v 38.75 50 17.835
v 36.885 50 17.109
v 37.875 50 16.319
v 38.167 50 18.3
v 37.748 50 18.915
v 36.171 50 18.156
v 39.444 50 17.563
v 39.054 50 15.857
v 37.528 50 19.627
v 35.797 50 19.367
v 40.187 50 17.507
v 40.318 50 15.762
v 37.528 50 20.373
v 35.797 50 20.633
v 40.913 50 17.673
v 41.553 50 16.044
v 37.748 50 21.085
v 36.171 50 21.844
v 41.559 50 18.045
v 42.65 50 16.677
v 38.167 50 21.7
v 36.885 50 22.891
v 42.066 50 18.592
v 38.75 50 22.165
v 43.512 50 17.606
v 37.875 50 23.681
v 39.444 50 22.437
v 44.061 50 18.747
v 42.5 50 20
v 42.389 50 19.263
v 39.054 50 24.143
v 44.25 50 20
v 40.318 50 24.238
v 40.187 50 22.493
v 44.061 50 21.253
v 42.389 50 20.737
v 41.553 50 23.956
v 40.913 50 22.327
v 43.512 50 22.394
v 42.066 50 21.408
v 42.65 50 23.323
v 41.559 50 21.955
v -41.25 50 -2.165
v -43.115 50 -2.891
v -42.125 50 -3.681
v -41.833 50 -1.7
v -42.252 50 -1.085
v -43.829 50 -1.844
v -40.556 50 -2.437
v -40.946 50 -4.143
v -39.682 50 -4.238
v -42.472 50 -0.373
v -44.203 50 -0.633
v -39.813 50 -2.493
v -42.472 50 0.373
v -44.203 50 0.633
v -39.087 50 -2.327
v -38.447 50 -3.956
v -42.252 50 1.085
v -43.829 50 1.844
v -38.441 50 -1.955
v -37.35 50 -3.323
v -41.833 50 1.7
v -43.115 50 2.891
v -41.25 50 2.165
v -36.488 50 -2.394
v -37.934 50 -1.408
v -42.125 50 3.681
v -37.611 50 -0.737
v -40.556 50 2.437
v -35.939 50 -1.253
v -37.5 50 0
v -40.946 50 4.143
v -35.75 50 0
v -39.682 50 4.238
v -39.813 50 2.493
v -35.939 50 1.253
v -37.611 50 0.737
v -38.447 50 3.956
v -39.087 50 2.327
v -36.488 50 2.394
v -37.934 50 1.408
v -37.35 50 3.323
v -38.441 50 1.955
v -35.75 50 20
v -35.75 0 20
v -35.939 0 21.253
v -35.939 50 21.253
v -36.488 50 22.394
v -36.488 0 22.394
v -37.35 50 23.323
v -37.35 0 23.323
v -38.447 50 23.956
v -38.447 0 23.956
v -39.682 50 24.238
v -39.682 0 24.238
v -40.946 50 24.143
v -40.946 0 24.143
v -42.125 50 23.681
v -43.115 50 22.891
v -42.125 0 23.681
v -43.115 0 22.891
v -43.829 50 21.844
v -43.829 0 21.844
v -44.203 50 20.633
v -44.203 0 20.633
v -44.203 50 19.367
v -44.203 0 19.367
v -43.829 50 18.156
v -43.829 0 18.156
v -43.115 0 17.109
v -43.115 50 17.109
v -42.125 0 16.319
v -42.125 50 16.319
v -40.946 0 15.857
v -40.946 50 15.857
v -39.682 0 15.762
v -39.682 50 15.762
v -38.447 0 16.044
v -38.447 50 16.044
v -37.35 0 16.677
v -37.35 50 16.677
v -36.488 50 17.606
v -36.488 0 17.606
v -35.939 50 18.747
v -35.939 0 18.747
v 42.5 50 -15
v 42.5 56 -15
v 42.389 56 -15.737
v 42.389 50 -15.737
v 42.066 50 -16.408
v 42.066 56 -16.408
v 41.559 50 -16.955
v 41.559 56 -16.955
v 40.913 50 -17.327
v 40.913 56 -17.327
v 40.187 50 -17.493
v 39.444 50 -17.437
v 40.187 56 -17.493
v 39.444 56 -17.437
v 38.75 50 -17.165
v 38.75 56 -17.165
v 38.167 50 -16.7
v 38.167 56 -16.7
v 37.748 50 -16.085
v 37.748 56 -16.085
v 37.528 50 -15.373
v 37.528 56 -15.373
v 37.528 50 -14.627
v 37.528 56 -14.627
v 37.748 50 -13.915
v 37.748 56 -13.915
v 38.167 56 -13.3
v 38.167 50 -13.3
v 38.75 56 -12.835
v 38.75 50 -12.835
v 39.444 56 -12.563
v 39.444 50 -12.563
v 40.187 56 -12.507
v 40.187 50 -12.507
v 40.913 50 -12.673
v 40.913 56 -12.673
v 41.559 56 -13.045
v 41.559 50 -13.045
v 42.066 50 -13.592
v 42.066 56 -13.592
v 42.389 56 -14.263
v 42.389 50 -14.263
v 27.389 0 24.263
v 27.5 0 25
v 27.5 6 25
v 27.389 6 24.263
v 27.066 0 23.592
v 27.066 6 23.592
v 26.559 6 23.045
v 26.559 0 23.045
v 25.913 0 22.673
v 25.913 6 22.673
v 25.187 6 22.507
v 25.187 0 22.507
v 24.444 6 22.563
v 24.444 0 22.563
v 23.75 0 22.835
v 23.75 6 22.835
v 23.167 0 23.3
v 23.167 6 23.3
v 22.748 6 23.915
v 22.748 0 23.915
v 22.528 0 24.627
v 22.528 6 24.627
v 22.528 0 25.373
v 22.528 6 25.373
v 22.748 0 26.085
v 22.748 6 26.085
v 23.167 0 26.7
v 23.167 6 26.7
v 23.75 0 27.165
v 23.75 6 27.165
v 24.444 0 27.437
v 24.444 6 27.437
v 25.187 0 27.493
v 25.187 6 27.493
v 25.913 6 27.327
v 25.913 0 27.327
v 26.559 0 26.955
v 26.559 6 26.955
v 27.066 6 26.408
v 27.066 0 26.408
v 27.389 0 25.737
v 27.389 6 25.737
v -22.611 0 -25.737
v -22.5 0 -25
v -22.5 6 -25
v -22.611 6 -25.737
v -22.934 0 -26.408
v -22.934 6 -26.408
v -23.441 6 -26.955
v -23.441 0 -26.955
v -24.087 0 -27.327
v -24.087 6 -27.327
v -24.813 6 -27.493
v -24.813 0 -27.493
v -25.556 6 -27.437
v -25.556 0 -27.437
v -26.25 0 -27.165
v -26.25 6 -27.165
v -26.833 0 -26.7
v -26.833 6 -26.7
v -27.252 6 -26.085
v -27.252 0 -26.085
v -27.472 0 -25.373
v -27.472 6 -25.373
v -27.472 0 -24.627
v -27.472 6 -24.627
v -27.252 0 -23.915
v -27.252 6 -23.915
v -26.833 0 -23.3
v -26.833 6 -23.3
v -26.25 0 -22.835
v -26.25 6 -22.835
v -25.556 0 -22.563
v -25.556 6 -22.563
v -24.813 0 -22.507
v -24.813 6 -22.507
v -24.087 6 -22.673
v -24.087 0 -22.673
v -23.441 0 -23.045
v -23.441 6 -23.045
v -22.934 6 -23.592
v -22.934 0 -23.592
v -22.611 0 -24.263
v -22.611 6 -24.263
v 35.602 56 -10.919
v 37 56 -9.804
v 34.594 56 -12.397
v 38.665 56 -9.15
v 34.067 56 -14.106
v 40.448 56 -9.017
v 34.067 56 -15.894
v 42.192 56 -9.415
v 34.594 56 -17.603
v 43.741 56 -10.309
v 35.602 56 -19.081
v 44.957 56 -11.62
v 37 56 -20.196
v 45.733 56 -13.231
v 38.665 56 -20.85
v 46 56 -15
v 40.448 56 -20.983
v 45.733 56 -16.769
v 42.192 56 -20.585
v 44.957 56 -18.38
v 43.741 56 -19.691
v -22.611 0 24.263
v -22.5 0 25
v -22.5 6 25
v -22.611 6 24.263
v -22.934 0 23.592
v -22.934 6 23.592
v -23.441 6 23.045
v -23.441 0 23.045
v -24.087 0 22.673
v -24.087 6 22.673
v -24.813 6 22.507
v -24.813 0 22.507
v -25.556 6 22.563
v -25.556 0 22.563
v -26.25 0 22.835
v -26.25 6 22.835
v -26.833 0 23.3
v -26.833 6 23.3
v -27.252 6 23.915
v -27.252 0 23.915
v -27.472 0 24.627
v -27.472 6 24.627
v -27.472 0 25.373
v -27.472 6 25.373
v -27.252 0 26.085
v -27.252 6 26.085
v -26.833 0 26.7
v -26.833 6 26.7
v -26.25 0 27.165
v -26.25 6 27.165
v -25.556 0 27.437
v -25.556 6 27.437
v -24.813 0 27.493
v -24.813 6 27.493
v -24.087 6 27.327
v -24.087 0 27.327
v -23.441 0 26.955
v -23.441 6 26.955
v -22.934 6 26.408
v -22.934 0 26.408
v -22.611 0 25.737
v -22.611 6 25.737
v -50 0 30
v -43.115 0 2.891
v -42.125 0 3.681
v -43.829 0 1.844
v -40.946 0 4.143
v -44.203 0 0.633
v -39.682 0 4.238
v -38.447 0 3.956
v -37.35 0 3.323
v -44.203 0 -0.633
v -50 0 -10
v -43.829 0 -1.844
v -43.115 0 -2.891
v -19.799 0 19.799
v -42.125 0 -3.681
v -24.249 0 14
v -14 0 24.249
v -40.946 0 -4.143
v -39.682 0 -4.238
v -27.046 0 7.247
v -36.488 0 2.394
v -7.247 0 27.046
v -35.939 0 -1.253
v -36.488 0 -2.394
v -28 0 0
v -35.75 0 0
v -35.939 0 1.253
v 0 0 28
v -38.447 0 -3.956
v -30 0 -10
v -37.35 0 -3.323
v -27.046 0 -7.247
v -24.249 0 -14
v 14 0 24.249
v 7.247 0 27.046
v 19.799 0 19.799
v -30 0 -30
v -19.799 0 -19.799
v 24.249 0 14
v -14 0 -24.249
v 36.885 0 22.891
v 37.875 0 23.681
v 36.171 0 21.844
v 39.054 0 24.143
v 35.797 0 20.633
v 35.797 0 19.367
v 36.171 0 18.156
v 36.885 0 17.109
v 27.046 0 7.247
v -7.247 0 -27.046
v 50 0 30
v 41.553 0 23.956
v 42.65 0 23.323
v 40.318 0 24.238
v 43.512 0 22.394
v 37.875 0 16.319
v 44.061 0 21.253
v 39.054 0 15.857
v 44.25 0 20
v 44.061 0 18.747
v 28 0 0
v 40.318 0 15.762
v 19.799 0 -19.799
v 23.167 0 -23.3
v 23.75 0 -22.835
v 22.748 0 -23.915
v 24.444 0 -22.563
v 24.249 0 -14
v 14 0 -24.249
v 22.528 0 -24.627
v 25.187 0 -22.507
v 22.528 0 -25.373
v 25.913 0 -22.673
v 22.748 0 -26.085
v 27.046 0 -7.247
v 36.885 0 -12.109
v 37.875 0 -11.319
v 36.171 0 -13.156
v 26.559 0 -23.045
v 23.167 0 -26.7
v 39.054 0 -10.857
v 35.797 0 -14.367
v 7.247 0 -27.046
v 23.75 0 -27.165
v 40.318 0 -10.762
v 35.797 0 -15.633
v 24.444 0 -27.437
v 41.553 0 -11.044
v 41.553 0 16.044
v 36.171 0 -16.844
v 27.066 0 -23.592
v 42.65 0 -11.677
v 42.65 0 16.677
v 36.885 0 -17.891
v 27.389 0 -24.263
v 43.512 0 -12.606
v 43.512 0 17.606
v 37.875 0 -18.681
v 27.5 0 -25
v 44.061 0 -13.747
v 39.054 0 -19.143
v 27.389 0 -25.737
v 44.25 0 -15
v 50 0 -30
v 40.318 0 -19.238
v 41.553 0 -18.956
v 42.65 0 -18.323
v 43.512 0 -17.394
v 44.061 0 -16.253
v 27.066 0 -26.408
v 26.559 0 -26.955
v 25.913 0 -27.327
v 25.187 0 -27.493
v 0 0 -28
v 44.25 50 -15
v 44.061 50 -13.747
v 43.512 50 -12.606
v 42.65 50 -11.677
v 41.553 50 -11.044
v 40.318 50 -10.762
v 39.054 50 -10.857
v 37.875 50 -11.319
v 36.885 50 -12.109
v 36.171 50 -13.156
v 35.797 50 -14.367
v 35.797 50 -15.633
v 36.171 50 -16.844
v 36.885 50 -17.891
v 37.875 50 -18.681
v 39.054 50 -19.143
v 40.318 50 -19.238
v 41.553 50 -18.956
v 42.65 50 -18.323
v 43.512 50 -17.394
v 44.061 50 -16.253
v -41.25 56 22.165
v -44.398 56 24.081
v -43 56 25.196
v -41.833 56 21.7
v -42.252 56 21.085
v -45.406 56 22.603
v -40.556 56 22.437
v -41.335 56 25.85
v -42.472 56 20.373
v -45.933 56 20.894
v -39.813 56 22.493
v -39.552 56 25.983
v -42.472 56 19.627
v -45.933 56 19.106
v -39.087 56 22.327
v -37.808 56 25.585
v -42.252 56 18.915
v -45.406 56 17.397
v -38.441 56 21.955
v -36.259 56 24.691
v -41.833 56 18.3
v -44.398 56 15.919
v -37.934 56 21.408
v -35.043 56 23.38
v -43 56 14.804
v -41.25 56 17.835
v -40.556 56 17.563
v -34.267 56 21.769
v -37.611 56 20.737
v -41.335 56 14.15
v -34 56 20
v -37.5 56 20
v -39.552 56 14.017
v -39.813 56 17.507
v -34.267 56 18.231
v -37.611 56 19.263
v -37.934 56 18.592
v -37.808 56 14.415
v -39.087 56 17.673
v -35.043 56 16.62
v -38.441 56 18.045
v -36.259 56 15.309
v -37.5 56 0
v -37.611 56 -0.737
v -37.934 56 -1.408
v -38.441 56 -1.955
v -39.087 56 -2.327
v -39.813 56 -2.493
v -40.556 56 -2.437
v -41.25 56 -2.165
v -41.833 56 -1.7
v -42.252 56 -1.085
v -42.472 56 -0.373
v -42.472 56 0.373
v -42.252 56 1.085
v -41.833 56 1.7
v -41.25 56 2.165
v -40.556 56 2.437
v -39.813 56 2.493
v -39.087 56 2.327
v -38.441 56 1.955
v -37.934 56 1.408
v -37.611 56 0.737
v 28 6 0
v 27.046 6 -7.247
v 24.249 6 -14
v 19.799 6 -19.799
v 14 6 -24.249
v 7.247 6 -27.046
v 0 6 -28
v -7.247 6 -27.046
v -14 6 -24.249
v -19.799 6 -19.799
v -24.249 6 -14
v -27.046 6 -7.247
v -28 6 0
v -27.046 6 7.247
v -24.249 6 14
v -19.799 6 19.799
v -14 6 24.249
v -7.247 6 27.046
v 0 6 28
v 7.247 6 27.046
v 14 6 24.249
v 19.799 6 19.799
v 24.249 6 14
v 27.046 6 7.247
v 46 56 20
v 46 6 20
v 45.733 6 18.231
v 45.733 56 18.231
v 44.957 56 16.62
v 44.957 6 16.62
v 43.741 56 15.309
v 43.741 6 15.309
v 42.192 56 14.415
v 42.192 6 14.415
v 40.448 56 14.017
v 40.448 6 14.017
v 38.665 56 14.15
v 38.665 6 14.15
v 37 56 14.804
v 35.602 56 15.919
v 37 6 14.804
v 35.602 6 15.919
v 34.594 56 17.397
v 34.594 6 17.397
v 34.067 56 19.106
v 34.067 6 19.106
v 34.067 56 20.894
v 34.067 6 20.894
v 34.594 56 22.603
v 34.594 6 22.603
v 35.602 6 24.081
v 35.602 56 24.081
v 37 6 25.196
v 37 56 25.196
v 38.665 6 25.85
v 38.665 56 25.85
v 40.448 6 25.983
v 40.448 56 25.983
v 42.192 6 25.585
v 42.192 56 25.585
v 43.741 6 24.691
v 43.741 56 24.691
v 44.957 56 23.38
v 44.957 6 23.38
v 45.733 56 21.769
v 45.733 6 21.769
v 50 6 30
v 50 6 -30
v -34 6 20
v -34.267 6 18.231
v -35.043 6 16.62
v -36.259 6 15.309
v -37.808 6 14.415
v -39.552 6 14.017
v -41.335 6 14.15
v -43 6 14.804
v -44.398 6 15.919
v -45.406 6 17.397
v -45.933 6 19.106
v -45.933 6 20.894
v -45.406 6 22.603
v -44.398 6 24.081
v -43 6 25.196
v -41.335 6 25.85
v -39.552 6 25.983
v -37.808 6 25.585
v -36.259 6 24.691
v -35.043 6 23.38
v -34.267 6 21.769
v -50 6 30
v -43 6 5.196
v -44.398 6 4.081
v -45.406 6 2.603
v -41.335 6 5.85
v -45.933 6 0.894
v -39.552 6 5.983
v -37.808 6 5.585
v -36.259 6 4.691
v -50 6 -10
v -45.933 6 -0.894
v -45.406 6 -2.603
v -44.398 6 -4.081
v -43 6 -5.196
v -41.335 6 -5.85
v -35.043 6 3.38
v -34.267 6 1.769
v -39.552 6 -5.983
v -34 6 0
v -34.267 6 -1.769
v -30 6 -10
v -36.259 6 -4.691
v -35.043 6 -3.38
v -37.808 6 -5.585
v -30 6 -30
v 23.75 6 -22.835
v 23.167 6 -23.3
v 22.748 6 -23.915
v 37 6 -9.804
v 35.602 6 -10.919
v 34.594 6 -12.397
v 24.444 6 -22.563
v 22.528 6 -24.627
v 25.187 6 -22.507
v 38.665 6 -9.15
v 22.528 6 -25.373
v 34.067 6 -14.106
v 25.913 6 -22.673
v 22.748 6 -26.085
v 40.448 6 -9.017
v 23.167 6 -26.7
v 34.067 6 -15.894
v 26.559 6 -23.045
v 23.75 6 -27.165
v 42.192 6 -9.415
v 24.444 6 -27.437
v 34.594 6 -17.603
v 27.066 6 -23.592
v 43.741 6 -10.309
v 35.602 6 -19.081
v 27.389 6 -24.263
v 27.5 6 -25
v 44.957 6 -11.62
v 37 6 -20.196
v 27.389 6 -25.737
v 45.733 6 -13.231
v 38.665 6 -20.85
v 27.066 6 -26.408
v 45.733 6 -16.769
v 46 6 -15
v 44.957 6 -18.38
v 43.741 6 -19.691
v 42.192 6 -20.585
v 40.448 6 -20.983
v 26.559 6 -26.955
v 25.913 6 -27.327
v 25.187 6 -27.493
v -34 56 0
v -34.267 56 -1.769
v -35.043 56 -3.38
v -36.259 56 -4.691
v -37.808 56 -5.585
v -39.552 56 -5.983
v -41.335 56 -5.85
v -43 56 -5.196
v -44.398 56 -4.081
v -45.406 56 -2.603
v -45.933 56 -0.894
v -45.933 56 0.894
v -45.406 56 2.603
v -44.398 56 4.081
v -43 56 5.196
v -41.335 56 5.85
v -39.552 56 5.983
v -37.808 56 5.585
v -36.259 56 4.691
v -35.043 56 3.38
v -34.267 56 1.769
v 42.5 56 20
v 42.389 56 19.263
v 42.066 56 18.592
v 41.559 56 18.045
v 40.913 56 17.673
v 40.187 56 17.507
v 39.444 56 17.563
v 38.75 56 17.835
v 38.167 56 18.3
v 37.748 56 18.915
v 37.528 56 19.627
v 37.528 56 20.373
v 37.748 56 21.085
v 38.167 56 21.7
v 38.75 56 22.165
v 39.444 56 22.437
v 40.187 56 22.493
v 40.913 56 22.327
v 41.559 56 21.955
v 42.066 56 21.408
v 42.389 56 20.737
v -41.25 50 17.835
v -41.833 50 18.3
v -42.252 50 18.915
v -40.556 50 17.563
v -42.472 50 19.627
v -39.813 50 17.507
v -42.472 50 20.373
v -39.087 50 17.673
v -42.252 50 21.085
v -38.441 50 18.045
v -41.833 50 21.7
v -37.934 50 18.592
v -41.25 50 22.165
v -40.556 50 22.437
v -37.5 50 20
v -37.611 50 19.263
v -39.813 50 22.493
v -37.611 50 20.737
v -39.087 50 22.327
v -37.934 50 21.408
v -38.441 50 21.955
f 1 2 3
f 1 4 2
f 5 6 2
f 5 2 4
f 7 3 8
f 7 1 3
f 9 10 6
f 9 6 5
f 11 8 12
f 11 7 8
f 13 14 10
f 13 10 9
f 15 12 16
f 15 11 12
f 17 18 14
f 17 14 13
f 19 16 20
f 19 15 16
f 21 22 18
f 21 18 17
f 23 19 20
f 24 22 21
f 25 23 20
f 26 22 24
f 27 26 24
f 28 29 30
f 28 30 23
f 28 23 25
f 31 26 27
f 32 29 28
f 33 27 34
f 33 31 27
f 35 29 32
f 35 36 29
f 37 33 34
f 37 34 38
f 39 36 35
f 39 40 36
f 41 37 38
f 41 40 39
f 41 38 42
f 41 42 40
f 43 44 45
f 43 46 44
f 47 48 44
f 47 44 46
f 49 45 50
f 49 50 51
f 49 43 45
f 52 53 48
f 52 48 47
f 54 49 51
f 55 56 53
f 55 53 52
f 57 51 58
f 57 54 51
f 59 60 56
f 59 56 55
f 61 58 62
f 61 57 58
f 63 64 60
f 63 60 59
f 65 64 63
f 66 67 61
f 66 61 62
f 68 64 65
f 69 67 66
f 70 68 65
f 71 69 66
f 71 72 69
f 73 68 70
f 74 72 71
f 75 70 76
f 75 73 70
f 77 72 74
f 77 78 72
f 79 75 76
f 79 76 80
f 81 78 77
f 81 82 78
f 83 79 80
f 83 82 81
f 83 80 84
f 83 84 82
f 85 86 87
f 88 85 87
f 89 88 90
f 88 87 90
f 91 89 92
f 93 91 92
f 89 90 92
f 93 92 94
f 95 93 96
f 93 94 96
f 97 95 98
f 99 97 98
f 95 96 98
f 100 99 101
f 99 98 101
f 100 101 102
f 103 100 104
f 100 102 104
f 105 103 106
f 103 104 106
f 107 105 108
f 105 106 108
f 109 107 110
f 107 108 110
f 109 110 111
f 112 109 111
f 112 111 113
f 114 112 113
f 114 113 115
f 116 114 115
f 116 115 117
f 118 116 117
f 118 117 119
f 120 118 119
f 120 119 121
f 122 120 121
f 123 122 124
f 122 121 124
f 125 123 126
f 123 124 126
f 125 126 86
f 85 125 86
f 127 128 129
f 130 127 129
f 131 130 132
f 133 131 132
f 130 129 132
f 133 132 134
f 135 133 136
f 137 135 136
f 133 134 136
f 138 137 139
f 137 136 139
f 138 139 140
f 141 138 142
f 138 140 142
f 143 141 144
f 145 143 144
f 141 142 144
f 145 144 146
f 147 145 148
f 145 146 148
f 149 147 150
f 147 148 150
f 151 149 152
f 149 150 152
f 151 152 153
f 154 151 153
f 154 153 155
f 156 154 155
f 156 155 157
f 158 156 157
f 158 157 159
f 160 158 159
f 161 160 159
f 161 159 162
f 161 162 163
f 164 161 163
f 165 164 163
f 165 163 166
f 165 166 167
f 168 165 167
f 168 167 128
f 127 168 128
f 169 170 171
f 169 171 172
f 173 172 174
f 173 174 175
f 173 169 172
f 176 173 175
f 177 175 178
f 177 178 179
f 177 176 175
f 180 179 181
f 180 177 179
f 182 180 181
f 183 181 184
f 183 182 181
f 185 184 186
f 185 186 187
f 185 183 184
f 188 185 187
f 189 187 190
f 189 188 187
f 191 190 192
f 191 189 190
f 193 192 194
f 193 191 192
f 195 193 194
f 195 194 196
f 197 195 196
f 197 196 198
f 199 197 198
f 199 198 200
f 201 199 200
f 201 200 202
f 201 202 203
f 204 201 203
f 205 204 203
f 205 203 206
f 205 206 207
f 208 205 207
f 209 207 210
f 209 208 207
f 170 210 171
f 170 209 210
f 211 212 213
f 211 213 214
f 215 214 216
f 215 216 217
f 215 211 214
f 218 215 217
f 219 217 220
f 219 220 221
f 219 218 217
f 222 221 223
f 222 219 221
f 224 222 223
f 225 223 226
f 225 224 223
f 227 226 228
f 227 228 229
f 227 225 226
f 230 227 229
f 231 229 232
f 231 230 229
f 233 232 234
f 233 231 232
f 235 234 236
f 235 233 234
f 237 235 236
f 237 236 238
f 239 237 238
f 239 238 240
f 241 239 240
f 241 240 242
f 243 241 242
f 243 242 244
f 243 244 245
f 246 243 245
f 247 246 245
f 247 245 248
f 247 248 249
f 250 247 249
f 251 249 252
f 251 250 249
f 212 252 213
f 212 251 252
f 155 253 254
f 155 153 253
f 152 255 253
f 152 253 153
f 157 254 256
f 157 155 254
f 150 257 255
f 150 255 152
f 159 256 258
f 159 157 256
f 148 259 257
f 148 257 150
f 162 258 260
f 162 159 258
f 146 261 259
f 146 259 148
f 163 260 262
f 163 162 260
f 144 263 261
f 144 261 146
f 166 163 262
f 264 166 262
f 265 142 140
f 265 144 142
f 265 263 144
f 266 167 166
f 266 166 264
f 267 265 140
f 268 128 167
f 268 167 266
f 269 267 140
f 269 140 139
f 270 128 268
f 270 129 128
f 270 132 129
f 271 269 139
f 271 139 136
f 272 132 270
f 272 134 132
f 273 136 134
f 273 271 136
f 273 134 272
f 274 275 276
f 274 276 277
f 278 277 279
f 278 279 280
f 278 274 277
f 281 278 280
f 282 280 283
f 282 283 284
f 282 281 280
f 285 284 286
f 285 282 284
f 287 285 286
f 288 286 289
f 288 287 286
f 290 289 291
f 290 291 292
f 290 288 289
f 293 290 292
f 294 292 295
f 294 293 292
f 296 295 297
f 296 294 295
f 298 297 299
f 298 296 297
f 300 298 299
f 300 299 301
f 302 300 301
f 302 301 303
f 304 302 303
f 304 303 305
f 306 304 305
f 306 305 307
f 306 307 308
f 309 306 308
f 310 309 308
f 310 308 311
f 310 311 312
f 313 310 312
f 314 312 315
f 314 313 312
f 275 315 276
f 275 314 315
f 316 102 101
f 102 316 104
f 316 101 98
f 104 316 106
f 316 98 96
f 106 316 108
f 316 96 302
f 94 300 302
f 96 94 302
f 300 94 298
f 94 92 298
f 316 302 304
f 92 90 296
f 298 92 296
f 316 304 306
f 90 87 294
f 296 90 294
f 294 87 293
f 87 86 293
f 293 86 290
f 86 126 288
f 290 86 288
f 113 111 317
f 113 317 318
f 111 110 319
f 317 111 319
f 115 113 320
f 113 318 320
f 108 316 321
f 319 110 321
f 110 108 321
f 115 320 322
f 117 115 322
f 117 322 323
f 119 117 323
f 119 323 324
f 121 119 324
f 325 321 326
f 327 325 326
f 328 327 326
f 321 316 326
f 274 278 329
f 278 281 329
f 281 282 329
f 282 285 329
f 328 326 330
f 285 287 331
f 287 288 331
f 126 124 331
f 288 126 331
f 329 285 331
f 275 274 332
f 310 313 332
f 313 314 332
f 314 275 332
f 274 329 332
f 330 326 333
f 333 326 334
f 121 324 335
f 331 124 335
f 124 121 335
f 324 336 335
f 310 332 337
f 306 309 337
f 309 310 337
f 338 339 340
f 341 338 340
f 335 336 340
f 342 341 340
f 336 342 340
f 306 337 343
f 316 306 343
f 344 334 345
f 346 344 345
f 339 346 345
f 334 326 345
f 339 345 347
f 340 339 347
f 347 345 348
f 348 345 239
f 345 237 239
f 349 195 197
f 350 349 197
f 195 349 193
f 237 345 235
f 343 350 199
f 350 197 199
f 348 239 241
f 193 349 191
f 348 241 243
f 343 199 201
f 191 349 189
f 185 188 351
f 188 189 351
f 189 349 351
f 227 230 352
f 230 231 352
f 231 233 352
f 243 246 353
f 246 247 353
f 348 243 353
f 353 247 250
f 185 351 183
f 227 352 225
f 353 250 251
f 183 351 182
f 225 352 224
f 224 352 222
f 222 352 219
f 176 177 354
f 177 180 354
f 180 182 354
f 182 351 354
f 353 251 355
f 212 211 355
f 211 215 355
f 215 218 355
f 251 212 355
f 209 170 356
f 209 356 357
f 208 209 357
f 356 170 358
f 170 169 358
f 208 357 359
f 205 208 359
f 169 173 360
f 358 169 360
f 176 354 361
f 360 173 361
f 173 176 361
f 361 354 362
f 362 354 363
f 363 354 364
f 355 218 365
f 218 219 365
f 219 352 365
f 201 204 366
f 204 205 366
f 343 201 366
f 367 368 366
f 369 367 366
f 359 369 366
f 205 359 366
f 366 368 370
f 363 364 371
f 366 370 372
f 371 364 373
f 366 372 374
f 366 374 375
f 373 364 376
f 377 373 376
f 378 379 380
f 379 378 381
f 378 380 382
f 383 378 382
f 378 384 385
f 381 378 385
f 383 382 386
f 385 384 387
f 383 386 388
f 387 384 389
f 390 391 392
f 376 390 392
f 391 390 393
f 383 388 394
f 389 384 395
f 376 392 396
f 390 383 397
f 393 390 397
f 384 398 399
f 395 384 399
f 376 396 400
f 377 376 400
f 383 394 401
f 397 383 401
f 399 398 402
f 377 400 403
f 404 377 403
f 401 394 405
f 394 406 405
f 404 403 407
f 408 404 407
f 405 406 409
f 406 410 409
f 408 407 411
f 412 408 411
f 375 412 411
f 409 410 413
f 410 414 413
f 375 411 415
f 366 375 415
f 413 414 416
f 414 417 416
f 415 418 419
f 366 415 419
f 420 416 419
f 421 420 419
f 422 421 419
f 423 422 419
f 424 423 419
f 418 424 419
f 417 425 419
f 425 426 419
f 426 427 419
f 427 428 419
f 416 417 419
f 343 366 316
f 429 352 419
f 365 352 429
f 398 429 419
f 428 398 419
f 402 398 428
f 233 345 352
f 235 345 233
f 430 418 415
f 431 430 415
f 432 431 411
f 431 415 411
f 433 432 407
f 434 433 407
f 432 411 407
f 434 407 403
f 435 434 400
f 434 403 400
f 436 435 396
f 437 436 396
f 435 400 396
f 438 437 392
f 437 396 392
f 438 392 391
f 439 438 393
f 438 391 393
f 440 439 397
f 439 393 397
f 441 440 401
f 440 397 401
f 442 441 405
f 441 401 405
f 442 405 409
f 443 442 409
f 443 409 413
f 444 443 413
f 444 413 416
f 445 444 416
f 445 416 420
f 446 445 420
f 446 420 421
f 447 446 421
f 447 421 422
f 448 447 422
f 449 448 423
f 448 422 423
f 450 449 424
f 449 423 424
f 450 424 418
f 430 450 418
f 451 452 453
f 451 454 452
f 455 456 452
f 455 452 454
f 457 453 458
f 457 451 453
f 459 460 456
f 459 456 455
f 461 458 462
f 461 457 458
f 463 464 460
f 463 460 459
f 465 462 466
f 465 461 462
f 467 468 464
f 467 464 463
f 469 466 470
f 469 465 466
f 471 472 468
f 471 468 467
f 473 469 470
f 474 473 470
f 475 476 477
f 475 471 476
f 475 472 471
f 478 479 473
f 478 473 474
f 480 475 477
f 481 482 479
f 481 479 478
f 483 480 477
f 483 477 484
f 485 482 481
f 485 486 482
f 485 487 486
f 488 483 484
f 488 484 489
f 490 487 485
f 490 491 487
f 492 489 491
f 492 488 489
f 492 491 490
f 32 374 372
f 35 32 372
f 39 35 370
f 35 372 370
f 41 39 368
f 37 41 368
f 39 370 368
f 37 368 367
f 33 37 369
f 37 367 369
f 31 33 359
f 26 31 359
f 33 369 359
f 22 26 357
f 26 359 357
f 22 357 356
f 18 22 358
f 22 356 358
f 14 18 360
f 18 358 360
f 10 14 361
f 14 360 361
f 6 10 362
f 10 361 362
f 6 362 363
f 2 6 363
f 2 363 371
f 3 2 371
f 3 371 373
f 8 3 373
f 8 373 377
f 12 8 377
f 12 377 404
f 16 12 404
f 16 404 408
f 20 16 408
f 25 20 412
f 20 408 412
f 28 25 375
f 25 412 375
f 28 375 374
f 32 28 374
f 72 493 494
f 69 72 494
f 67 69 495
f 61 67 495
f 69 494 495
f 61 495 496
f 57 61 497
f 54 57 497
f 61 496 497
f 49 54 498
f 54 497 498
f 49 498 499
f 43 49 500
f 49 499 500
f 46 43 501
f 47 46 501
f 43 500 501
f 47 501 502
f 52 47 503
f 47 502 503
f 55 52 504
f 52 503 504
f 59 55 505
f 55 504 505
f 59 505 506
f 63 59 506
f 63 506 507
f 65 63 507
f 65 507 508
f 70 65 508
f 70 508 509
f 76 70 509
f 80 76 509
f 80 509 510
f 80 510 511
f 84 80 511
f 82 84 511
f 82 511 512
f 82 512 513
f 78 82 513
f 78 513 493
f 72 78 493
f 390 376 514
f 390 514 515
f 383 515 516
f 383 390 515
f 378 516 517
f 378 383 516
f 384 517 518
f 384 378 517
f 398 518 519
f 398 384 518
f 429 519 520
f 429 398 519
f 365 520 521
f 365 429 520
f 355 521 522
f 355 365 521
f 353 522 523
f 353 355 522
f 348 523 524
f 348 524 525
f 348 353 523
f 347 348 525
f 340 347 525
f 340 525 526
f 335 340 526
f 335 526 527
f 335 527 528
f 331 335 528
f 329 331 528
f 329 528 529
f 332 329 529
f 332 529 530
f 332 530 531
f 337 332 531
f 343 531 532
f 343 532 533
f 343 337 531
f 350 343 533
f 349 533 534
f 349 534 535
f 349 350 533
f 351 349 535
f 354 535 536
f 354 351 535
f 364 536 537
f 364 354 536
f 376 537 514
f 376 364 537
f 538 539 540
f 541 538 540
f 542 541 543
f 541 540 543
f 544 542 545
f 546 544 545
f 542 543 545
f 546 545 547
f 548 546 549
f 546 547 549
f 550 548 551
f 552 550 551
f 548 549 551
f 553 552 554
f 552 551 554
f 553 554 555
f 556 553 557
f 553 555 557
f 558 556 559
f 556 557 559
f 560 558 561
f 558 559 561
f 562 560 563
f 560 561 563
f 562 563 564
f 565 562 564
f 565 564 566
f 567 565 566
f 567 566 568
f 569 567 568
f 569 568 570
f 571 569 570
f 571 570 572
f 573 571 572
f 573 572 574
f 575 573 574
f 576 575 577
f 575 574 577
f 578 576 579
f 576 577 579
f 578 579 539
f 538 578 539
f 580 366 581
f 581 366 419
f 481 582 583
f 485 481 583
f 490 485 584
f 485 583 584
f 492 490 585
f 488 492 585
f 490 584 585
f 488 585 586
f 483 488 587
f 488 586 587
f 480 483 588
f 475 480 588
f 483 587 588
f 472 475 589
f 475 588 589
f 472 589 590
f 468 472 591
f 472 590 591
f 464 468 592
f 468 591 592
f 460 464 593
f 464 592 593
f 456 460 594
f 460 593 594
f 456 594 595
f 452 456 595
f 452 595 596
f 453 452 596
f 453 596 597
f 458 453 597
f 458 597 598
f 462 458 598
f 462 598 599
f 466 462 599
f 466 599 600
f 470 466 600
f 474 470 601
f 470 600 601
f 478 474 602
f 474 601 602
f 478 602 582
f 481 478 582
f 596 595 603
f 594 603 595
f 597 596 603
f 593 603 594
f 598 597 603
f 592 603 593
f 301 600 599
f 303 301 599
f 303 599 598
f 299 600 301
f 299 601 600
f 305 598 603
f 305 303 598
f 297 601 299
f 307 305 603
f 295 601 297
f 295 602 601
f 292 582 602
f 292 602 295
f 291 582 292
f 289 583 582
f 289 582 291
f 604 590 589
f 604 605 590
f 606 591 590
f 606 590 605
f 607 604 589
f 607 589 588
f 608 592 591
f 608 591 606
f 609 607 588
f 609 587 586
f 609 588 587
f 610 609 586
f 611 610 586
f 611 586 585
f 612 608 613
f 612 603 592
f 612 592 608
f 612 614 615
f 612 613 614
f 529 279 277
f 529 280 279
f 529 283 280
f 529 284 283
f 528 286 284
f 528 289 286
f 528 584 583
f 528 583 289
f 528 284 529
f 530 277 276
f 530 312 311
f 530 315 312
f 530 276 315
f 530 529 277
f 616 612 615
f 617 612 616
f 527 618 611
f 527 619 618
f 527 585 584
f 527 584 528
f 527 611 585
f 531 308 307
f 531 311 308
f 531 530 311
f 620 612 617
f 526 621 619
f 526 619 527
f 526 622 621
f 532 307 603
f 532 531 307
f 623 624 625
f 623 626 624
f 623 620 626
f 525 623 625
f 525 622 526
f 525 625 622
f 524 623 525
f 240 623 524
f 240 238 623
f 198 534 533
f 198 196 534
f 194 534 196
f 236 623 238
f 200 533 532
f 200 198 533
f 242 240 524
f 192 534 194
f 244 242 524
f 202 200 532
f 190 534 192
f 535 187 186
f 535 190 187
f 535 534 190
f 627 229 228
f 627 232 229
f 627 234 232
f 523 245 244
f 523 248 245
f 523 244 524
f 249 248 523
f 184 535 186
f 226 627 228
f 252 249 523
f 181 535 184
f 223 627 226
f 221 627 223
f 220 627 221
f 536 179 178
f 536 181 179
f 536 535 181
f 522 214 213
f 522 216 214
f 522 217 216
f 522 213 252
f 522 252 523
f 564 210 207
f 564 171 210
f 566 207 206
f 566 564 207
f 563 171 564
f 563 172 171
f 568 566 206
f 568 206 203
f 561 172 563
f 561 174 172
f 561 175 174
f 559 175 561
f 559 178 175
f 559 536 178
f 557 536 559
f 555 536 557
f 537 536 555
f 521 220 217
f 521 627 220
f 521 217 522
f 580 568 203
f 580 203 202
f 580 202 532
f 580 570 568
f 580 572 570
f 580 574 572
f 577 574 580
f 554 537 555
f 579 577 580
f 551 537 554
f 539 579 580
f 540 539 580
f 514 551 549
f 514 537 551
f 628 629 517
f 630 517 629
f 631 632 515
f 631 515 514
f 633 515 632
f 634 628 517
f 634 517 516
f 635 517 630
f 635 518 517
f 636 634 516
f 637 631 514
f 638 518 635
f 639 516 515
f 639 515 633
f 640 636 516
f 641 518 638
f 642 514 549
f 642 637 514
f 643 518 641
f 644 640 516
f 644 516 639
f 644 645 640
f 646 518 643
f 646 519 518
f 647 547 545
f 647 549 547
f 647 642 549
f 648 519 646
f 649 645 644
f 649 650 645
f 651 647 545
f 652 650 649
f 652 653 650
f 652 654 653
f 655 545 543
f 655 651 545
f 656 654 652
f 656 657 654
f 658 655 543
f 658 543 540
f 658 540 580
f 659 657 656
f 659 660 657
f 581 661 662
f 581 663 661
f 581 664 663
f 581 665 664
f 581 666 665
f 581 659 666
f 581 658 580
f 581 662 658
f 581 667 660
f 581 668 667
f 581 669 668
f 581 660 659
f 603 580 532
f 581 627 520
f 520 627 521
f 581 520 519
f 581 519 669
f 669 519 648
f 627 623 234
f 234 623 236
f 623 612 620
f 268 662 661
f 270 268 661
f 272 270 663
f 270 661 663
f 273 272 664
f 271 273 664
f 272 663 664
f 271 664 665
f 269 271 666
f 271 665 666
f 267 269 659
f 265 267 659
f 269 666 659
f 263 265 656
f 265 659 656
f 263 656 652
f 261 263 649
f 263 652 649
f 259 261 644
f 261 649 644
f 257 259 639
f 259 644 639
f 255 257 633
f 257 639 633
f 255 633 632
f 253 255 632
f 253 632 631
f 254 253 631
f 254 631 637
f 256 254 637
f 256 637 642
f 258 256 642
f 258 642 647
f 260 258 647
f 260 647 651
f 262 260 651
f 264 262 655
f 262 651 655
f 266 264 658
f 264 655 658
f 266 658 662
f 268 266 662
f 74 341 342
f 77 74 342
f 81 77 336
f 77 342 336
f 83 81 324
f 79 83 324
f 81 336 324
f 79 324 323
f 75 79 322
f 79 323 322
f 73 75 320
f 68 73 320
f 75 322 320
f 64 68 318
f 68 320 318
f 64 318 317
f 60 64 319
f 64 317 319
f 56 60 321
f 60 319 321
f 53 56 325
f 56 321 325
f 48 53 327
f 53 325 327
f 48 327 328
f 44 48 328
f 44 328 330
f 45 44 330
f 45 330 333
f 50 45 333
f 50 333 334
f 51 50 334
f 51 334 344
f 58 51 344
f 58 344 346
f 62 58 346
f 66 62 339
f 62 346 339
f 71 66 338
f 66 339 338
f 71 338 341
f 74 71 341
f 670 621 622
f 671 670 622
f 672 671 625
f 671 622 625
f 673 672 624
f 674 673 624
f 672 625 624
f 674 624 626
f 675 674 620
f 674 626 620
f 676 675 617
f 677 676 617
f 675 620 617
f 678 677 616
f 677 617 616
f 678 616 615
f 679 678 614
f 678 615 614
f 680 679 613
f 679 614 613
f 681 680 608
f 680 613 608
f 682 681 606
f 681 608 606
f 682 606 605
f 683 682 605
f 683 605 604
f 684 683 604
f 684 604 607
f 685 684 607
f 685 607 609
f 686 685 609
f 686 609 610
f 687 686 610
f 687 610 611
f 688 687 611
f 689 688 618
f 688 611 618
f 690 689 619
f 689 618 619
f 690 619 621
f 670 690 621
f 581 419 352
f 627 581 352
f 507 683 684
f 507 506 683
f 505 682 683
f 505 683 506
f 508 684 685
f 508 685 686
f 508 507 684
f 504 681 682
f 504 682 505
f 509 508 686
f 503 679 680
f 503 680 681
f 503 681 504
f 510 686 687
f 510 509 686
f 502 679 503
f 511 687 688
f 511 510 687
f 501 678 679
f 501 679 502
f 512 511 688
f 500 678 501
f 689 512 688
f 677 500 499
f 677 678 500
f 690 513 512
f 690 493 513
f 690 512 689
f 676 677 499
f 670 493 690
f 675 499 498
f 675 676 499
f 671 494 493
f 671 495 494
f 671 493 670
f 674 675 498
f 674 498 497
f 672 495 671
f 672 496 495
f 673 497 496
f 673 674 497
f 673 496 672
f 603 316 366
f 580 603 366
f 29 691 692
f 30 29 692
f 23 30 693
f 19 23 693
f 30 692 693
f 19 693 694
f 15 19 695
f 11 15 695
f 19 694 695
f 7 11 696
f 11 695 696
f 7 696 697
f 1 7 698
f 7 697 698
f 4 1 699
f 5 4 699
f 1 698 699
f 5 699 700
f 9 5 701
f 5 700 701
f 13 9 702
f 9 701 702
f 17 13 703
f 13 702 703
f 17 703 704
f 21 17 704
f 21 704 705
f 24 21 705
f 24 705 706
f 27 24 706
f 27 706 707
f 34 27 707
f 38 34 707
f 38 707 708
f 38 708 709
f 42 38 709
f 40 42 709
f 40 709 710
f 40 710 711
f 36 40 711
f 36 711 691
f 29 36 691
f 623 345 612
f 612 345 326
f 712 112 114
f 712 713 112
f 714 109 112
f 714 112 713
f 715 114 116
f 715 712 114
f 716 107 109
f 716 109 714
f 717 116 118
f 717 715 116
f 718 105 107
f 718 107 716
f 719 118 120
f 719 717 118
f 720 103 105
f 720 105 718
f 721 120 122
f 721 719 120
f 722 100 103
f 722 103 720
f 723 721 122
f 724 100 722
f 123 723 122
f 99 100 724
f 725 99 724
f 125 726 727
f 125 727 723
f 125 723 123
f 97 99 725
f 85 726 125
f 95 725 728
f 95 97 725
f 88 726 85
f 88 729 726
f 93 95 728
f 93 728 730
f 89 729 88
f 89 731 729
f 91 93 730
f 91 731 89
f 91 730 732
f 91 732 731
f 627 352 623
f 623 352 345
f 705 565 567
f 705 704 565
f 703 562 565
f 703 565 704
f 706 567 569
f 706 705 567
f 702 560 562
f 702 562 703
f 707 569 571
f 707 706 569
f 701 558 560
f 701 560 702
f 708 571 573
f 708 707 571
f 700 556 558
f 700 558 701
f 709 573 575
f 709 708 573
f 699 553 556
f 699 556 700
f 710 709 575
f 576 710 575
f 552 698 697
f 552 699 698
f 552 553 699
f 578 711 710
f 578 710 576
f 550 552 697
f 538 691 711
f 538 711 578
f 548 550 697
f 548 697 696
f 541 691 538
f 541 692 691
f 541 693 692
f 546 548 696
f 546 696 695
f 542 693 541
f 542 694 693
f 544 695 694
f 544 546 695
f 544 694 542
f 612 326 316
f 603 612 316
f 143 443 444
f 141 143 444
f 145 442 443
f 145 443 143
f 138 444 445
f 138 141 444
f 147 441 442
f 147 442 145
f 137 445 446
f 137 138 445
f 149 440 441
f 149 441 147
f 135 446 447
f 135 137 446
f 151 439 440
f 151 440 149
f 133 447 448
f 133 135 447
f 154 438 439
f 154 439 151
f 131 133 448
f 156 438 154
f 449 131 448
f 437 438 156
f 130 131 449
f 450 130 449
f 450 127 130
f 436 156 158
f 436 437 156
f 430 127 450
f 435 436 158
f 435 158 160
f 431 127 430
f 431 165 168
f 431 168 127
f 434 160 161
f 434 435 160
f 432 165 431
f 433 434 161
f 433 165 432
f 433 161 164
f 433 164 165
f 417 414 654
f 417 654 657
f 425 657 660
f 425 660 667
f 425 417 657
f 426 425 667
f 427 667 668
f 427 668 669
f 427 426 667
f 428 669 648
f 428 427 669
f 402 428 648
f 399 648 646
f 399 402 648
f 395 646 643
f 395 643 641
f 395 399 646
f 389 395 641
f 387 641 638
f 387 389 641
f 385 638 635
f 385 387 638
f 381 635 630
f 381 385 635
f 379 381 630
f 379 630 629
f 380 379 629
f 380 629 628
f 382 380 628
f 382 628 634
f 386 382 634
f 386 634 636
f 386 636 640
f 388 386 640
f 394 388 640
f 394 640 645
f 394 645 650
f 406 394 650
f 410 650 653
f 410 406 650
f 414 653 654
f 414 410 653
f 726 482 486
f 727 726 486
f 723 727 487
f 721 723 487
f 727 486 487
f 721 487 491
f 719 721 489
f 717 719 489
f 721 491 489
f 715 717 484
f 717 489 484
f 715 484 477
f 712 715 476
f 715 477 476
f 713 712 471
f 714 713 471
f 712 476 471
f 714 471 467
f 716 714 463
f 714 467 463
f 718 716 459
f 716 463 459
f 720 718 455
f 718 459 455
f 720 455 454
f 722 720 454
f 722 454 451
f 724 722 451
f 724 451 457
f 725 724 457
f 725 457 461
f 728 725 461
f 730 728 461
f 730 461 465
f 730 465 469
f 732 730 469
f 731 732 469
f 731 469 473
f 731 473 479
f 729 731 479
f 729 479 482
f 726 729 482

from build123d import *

# Parameters (mm, degrees)
SKETCH1_R           = 28
SKETCH1_R_2         = 2.5
BOSS_EXTRUDE1_DEPTH = 6
SKETCH2_R           = 6
BOSS_EXTRUDE2_DEPTH = 50
SKETCH3_R           = 2.5
CUT_EXTRUDE1_DEPTH  = 57
SKETCH5_R           = 4.25
CUT_EXTRUDE2_DEPTH  = 50


with BuildPart() as part:
    # Sketch1 → Boss-Extrude1 (new body)
    with BuildSketch(Plane(origin=(0, 0, 0), x_dir=(1, 0, 0), z_dir=(0, 1, 0))):
        Polygon((-50, -30), (50, -30), (50, 30), (-30, 30), (-30, 10), (-50, 10), align=None)
        Circle(SKETCH1_R, mode=Mode.SUBTRACT)
        with Locations((-25, 25)):
            Circle(SKETCH1_R_2, mode=Mode.SUBTRACT)
        with Locations((25, 25)):
            Circle(SKETCH1_R_2, mode=Mode.SUBTRACT)
        with Locations((25, -25)):
            Circle(SKETCH1_R_2, mode=Mode.SUBTRACT)
        with Locations((-25, -25)):
            Circle(SKETCH1_R_2, mode=Mode.SUBTRACT)
    extrude(amount=BOSS_EXTRUDE1_DEPTH)

    # Sketch2 → Boss-Extrude2 (add)
    with BuildSketch(Plane(origin=(0, 6, 0), x_dir=(1, 0, 0), z_dir=(0, 1, 0))):
        with Locations((-40, 0)):
            Circle(SKETCH2_R)
        with Locations((-40, -20)):
            Circle(SKETCH2_R)
        with Locations((40, 15)):
            Circle(SKETCH2_R)
        with Locations((40, -20)):
            Circle(SKETCH2_R)
    extrude(amount=BOSS_EXTRUDE2_DEPTH)

    # Sketch3 → Cut-Extrude1 (cut, through all)
    with BuildSketch(Plane(origin=(0, 56, 0), x_dir=(1, 0, 0), z_dir=(0, 1, 0))):
        with Locations((-40, 0)):
            Circle(SKETCH3_R)
        with Locations((-40, -20)):
            Circle(SKETCH3_R)
        with Locations((40, -20)):
            Circle(SKETCH3_R)
        with Locations((40, 15)):
            Circle(SKETCH3_R)
    extrude(amount=-CUT_EXTRUDE1_DEPTH, mode=Mode.SUBTRACT)

    # Sketch5 → Cut-Extrude2 (cut)
    with BuildSketch(Plane.XZ):
        with Locations((-40, 0)):
            Circle(SKETCH5_R)
        with Locations((-40, 20)):
            Circle(SKETCH5_R)
        with Locations((40, 20)):
            Circle(SKETCH5_R)
        with Locations((40, -15)):
            Circle(SKETCH5_R)
    extrude(amount=-CUT_EXTRUDE2_DEPTH, mode=Mode.SUBTRACT)


solid = part.part
